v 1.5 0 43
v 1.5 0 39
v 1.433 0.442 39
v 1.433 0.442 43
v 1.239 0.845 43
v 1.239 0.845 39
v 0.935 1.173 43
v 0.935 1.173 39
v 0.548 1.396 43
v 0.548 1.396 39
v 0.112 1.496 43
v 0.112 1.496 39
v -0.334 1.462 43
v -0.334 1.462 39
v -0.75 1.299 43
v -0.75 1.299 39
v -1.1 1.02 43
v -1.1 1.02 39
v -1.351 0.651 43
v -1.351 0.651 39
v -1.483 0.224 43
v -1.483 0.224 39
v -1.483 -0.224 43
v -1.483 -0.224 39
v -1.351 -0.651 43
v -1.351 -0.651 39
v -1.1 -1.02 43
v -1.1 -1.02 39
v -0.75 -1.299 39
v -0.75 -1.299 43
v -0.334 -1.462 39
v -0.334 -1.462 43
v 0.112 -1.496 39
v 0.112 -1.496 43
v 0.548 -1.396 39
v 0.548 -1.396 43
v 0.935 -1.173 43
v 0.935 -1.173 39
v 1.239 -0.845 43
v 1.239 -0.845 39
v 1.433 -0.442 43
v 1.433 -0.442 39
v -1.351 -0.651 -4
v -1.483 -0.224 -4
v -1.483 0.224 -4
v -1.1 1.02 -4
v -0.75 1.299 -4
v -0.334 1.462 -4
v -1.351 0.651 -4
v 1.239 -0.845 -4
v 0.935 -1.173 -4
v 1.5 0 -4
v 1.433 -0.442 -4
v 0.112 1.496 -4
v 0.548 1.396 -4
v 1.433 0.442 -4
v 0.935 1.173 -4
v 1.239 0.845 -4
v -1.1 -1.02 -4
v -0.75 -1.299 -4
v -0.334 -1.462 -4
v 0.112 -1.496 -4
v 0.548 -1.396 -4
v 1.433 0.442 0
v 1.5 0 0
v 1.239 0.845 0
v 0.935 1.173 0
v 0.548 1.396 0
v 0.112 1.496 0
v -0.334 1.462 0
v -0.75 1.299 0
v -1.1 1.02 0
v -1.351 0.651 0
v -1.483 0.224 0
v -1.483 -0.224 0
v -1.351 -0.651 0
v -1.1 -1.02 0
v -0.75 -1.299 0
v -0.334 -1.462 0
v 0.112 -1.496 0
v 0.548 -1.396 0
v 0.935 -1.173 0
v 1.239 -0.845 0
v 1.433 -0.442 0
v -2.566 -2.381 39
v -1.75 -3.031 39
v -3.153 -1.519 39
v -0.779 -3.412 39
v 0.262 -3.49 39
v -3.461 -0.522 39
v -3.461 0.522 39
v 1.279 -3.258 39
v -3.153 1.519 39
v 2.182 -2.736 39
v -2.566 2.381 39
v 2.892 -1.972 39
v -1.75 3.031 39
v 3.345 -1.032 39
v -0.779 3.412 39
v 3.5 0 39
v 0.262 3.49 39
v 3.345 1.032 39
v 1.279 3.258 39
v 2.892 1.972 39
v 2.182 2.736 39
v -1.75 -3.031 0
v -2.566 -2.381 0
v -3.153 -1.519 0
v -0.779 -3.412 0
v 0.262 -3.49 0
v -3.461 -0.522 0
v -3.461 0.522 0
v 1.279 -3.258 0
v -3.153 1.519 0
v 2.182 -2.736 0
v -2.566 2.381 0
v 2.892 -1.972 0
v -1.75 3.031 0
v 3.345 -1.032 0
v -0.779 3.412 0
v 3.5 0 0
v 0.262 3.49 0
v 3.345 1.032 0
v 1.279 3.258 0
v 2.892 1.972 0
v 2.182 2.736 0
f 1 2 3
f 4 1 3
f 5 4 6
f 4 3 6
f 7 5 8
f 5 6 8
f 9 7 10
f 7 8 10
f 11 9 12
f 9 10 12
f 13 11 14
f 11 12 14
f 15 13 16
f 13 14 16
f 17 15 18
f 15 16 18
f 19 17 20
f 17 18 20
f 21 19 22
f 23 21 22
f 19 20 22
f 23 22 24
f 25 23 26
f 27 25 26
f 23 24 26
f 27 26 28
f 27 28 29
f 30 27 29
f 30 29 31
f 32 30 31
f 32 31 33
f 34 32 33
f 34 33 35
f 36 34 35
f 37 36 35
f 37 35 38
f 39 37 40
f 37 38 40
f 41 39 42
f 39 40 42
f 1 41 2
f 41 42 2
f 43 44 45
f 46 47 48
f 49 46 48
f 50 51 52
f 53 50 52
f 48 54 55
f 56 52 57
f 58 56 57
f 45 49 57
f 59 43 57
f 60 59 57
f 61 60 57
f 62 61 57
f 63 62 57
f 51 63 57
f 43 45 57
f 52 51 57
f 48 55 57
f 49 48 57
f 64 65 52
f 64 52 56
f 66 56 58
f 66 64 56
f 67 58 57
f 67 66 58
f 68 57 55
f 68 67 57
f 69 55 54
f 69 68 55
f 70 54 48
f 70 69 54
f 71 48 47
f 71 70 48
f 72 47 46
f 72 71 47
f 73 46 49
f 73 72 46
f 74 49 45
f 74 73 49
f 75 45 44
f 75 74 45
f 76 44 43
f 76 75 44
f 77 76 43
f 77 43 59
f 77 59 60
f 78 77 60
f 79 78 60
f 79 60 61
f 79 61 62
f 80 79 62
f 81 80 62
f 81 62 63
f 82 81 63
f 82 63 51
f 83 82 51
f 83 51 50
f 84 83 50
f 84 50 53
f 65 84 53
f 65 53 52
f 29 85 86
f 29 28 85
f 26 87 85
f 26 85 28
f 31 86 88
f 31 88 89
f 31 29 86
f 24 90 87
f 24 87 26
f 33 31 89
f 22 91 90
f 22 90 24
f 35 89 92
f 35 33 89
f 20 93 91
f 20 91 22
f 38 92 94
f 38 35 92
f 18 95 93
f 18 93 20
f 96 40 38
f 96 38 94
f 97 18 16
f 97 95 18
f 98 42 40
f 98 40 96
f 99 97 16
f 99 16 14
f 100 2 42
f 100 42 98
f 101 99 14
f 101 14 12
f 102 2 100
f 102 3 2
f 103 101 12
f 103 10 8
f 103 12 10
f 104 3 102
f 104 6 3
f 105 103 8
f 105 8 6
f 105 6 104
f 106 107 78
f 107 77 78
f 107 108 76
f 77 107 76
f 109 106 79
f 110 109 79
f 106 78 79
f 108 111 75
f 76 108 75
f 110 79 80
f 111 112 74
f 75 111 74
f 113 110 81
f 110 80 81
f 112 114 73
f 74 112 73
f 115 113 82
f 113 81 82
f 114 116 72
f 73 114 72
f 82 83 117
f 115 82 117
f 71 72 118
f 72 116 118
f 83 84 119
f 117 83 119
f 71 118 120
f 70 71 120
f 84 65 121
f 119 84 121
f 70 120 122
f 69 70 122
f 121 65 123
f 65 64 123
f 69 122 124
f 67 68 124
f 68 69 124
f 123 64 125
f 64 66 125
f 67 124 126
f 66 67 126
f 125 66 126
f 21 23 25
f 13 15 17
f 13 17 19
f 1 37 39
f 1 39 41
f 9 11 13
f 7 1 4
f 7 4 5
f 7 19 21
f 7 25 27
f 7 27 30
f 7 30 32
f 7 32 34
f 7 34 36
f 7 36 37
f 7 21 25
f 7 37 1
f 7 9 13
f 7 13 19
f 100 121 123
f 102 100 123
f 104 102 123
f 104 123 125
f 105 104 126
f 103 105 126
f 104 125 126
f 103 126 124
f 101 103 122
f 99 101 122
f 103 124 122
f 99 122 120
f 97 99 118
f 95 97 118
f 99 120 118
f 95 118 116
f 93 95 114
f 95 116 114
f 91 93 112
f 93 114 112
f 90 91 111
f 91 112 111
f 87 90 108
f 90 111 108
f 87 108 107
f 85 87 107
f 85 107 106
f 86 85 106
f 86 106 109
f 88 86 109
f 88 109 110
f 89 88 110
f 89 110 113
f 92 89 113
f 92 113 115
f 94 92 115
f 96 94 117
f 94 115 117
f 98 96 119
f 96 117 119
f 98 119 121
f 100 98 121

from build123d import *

# Parameters (mm, degrees)
SKETCH_1_R           = 3.5
EXTRUDE_1_DEPTH      = 39
SKETCH_2_R           = 1.5
EXTRUDE_3_DEPTH      = 4
EXTRUDE_3_DEPTH_BACK = 43


with BuildPart() as part:
    # 草图1 → 凸台-拉伸1 (new body)
    with BuildSketch(Plane.XY):
        Circle(SKETCH_1_R)
    extrude(amount=EXTRUDE_1_DEPTH)

    # 草图2 → 凸台-拉伸3 (add, two sides)
    with BuildSketch(Plane.XY.offset(39)) as extrude_3_sk:
        Circle(SKETCH_2_R)
    extrude(amount=EXTRUDE_3_DEPTH)
    extrude(extrude_3_sk.sketch, amount=-EXTRUDE_3_DEPTH_BACK)


solid = part.part
